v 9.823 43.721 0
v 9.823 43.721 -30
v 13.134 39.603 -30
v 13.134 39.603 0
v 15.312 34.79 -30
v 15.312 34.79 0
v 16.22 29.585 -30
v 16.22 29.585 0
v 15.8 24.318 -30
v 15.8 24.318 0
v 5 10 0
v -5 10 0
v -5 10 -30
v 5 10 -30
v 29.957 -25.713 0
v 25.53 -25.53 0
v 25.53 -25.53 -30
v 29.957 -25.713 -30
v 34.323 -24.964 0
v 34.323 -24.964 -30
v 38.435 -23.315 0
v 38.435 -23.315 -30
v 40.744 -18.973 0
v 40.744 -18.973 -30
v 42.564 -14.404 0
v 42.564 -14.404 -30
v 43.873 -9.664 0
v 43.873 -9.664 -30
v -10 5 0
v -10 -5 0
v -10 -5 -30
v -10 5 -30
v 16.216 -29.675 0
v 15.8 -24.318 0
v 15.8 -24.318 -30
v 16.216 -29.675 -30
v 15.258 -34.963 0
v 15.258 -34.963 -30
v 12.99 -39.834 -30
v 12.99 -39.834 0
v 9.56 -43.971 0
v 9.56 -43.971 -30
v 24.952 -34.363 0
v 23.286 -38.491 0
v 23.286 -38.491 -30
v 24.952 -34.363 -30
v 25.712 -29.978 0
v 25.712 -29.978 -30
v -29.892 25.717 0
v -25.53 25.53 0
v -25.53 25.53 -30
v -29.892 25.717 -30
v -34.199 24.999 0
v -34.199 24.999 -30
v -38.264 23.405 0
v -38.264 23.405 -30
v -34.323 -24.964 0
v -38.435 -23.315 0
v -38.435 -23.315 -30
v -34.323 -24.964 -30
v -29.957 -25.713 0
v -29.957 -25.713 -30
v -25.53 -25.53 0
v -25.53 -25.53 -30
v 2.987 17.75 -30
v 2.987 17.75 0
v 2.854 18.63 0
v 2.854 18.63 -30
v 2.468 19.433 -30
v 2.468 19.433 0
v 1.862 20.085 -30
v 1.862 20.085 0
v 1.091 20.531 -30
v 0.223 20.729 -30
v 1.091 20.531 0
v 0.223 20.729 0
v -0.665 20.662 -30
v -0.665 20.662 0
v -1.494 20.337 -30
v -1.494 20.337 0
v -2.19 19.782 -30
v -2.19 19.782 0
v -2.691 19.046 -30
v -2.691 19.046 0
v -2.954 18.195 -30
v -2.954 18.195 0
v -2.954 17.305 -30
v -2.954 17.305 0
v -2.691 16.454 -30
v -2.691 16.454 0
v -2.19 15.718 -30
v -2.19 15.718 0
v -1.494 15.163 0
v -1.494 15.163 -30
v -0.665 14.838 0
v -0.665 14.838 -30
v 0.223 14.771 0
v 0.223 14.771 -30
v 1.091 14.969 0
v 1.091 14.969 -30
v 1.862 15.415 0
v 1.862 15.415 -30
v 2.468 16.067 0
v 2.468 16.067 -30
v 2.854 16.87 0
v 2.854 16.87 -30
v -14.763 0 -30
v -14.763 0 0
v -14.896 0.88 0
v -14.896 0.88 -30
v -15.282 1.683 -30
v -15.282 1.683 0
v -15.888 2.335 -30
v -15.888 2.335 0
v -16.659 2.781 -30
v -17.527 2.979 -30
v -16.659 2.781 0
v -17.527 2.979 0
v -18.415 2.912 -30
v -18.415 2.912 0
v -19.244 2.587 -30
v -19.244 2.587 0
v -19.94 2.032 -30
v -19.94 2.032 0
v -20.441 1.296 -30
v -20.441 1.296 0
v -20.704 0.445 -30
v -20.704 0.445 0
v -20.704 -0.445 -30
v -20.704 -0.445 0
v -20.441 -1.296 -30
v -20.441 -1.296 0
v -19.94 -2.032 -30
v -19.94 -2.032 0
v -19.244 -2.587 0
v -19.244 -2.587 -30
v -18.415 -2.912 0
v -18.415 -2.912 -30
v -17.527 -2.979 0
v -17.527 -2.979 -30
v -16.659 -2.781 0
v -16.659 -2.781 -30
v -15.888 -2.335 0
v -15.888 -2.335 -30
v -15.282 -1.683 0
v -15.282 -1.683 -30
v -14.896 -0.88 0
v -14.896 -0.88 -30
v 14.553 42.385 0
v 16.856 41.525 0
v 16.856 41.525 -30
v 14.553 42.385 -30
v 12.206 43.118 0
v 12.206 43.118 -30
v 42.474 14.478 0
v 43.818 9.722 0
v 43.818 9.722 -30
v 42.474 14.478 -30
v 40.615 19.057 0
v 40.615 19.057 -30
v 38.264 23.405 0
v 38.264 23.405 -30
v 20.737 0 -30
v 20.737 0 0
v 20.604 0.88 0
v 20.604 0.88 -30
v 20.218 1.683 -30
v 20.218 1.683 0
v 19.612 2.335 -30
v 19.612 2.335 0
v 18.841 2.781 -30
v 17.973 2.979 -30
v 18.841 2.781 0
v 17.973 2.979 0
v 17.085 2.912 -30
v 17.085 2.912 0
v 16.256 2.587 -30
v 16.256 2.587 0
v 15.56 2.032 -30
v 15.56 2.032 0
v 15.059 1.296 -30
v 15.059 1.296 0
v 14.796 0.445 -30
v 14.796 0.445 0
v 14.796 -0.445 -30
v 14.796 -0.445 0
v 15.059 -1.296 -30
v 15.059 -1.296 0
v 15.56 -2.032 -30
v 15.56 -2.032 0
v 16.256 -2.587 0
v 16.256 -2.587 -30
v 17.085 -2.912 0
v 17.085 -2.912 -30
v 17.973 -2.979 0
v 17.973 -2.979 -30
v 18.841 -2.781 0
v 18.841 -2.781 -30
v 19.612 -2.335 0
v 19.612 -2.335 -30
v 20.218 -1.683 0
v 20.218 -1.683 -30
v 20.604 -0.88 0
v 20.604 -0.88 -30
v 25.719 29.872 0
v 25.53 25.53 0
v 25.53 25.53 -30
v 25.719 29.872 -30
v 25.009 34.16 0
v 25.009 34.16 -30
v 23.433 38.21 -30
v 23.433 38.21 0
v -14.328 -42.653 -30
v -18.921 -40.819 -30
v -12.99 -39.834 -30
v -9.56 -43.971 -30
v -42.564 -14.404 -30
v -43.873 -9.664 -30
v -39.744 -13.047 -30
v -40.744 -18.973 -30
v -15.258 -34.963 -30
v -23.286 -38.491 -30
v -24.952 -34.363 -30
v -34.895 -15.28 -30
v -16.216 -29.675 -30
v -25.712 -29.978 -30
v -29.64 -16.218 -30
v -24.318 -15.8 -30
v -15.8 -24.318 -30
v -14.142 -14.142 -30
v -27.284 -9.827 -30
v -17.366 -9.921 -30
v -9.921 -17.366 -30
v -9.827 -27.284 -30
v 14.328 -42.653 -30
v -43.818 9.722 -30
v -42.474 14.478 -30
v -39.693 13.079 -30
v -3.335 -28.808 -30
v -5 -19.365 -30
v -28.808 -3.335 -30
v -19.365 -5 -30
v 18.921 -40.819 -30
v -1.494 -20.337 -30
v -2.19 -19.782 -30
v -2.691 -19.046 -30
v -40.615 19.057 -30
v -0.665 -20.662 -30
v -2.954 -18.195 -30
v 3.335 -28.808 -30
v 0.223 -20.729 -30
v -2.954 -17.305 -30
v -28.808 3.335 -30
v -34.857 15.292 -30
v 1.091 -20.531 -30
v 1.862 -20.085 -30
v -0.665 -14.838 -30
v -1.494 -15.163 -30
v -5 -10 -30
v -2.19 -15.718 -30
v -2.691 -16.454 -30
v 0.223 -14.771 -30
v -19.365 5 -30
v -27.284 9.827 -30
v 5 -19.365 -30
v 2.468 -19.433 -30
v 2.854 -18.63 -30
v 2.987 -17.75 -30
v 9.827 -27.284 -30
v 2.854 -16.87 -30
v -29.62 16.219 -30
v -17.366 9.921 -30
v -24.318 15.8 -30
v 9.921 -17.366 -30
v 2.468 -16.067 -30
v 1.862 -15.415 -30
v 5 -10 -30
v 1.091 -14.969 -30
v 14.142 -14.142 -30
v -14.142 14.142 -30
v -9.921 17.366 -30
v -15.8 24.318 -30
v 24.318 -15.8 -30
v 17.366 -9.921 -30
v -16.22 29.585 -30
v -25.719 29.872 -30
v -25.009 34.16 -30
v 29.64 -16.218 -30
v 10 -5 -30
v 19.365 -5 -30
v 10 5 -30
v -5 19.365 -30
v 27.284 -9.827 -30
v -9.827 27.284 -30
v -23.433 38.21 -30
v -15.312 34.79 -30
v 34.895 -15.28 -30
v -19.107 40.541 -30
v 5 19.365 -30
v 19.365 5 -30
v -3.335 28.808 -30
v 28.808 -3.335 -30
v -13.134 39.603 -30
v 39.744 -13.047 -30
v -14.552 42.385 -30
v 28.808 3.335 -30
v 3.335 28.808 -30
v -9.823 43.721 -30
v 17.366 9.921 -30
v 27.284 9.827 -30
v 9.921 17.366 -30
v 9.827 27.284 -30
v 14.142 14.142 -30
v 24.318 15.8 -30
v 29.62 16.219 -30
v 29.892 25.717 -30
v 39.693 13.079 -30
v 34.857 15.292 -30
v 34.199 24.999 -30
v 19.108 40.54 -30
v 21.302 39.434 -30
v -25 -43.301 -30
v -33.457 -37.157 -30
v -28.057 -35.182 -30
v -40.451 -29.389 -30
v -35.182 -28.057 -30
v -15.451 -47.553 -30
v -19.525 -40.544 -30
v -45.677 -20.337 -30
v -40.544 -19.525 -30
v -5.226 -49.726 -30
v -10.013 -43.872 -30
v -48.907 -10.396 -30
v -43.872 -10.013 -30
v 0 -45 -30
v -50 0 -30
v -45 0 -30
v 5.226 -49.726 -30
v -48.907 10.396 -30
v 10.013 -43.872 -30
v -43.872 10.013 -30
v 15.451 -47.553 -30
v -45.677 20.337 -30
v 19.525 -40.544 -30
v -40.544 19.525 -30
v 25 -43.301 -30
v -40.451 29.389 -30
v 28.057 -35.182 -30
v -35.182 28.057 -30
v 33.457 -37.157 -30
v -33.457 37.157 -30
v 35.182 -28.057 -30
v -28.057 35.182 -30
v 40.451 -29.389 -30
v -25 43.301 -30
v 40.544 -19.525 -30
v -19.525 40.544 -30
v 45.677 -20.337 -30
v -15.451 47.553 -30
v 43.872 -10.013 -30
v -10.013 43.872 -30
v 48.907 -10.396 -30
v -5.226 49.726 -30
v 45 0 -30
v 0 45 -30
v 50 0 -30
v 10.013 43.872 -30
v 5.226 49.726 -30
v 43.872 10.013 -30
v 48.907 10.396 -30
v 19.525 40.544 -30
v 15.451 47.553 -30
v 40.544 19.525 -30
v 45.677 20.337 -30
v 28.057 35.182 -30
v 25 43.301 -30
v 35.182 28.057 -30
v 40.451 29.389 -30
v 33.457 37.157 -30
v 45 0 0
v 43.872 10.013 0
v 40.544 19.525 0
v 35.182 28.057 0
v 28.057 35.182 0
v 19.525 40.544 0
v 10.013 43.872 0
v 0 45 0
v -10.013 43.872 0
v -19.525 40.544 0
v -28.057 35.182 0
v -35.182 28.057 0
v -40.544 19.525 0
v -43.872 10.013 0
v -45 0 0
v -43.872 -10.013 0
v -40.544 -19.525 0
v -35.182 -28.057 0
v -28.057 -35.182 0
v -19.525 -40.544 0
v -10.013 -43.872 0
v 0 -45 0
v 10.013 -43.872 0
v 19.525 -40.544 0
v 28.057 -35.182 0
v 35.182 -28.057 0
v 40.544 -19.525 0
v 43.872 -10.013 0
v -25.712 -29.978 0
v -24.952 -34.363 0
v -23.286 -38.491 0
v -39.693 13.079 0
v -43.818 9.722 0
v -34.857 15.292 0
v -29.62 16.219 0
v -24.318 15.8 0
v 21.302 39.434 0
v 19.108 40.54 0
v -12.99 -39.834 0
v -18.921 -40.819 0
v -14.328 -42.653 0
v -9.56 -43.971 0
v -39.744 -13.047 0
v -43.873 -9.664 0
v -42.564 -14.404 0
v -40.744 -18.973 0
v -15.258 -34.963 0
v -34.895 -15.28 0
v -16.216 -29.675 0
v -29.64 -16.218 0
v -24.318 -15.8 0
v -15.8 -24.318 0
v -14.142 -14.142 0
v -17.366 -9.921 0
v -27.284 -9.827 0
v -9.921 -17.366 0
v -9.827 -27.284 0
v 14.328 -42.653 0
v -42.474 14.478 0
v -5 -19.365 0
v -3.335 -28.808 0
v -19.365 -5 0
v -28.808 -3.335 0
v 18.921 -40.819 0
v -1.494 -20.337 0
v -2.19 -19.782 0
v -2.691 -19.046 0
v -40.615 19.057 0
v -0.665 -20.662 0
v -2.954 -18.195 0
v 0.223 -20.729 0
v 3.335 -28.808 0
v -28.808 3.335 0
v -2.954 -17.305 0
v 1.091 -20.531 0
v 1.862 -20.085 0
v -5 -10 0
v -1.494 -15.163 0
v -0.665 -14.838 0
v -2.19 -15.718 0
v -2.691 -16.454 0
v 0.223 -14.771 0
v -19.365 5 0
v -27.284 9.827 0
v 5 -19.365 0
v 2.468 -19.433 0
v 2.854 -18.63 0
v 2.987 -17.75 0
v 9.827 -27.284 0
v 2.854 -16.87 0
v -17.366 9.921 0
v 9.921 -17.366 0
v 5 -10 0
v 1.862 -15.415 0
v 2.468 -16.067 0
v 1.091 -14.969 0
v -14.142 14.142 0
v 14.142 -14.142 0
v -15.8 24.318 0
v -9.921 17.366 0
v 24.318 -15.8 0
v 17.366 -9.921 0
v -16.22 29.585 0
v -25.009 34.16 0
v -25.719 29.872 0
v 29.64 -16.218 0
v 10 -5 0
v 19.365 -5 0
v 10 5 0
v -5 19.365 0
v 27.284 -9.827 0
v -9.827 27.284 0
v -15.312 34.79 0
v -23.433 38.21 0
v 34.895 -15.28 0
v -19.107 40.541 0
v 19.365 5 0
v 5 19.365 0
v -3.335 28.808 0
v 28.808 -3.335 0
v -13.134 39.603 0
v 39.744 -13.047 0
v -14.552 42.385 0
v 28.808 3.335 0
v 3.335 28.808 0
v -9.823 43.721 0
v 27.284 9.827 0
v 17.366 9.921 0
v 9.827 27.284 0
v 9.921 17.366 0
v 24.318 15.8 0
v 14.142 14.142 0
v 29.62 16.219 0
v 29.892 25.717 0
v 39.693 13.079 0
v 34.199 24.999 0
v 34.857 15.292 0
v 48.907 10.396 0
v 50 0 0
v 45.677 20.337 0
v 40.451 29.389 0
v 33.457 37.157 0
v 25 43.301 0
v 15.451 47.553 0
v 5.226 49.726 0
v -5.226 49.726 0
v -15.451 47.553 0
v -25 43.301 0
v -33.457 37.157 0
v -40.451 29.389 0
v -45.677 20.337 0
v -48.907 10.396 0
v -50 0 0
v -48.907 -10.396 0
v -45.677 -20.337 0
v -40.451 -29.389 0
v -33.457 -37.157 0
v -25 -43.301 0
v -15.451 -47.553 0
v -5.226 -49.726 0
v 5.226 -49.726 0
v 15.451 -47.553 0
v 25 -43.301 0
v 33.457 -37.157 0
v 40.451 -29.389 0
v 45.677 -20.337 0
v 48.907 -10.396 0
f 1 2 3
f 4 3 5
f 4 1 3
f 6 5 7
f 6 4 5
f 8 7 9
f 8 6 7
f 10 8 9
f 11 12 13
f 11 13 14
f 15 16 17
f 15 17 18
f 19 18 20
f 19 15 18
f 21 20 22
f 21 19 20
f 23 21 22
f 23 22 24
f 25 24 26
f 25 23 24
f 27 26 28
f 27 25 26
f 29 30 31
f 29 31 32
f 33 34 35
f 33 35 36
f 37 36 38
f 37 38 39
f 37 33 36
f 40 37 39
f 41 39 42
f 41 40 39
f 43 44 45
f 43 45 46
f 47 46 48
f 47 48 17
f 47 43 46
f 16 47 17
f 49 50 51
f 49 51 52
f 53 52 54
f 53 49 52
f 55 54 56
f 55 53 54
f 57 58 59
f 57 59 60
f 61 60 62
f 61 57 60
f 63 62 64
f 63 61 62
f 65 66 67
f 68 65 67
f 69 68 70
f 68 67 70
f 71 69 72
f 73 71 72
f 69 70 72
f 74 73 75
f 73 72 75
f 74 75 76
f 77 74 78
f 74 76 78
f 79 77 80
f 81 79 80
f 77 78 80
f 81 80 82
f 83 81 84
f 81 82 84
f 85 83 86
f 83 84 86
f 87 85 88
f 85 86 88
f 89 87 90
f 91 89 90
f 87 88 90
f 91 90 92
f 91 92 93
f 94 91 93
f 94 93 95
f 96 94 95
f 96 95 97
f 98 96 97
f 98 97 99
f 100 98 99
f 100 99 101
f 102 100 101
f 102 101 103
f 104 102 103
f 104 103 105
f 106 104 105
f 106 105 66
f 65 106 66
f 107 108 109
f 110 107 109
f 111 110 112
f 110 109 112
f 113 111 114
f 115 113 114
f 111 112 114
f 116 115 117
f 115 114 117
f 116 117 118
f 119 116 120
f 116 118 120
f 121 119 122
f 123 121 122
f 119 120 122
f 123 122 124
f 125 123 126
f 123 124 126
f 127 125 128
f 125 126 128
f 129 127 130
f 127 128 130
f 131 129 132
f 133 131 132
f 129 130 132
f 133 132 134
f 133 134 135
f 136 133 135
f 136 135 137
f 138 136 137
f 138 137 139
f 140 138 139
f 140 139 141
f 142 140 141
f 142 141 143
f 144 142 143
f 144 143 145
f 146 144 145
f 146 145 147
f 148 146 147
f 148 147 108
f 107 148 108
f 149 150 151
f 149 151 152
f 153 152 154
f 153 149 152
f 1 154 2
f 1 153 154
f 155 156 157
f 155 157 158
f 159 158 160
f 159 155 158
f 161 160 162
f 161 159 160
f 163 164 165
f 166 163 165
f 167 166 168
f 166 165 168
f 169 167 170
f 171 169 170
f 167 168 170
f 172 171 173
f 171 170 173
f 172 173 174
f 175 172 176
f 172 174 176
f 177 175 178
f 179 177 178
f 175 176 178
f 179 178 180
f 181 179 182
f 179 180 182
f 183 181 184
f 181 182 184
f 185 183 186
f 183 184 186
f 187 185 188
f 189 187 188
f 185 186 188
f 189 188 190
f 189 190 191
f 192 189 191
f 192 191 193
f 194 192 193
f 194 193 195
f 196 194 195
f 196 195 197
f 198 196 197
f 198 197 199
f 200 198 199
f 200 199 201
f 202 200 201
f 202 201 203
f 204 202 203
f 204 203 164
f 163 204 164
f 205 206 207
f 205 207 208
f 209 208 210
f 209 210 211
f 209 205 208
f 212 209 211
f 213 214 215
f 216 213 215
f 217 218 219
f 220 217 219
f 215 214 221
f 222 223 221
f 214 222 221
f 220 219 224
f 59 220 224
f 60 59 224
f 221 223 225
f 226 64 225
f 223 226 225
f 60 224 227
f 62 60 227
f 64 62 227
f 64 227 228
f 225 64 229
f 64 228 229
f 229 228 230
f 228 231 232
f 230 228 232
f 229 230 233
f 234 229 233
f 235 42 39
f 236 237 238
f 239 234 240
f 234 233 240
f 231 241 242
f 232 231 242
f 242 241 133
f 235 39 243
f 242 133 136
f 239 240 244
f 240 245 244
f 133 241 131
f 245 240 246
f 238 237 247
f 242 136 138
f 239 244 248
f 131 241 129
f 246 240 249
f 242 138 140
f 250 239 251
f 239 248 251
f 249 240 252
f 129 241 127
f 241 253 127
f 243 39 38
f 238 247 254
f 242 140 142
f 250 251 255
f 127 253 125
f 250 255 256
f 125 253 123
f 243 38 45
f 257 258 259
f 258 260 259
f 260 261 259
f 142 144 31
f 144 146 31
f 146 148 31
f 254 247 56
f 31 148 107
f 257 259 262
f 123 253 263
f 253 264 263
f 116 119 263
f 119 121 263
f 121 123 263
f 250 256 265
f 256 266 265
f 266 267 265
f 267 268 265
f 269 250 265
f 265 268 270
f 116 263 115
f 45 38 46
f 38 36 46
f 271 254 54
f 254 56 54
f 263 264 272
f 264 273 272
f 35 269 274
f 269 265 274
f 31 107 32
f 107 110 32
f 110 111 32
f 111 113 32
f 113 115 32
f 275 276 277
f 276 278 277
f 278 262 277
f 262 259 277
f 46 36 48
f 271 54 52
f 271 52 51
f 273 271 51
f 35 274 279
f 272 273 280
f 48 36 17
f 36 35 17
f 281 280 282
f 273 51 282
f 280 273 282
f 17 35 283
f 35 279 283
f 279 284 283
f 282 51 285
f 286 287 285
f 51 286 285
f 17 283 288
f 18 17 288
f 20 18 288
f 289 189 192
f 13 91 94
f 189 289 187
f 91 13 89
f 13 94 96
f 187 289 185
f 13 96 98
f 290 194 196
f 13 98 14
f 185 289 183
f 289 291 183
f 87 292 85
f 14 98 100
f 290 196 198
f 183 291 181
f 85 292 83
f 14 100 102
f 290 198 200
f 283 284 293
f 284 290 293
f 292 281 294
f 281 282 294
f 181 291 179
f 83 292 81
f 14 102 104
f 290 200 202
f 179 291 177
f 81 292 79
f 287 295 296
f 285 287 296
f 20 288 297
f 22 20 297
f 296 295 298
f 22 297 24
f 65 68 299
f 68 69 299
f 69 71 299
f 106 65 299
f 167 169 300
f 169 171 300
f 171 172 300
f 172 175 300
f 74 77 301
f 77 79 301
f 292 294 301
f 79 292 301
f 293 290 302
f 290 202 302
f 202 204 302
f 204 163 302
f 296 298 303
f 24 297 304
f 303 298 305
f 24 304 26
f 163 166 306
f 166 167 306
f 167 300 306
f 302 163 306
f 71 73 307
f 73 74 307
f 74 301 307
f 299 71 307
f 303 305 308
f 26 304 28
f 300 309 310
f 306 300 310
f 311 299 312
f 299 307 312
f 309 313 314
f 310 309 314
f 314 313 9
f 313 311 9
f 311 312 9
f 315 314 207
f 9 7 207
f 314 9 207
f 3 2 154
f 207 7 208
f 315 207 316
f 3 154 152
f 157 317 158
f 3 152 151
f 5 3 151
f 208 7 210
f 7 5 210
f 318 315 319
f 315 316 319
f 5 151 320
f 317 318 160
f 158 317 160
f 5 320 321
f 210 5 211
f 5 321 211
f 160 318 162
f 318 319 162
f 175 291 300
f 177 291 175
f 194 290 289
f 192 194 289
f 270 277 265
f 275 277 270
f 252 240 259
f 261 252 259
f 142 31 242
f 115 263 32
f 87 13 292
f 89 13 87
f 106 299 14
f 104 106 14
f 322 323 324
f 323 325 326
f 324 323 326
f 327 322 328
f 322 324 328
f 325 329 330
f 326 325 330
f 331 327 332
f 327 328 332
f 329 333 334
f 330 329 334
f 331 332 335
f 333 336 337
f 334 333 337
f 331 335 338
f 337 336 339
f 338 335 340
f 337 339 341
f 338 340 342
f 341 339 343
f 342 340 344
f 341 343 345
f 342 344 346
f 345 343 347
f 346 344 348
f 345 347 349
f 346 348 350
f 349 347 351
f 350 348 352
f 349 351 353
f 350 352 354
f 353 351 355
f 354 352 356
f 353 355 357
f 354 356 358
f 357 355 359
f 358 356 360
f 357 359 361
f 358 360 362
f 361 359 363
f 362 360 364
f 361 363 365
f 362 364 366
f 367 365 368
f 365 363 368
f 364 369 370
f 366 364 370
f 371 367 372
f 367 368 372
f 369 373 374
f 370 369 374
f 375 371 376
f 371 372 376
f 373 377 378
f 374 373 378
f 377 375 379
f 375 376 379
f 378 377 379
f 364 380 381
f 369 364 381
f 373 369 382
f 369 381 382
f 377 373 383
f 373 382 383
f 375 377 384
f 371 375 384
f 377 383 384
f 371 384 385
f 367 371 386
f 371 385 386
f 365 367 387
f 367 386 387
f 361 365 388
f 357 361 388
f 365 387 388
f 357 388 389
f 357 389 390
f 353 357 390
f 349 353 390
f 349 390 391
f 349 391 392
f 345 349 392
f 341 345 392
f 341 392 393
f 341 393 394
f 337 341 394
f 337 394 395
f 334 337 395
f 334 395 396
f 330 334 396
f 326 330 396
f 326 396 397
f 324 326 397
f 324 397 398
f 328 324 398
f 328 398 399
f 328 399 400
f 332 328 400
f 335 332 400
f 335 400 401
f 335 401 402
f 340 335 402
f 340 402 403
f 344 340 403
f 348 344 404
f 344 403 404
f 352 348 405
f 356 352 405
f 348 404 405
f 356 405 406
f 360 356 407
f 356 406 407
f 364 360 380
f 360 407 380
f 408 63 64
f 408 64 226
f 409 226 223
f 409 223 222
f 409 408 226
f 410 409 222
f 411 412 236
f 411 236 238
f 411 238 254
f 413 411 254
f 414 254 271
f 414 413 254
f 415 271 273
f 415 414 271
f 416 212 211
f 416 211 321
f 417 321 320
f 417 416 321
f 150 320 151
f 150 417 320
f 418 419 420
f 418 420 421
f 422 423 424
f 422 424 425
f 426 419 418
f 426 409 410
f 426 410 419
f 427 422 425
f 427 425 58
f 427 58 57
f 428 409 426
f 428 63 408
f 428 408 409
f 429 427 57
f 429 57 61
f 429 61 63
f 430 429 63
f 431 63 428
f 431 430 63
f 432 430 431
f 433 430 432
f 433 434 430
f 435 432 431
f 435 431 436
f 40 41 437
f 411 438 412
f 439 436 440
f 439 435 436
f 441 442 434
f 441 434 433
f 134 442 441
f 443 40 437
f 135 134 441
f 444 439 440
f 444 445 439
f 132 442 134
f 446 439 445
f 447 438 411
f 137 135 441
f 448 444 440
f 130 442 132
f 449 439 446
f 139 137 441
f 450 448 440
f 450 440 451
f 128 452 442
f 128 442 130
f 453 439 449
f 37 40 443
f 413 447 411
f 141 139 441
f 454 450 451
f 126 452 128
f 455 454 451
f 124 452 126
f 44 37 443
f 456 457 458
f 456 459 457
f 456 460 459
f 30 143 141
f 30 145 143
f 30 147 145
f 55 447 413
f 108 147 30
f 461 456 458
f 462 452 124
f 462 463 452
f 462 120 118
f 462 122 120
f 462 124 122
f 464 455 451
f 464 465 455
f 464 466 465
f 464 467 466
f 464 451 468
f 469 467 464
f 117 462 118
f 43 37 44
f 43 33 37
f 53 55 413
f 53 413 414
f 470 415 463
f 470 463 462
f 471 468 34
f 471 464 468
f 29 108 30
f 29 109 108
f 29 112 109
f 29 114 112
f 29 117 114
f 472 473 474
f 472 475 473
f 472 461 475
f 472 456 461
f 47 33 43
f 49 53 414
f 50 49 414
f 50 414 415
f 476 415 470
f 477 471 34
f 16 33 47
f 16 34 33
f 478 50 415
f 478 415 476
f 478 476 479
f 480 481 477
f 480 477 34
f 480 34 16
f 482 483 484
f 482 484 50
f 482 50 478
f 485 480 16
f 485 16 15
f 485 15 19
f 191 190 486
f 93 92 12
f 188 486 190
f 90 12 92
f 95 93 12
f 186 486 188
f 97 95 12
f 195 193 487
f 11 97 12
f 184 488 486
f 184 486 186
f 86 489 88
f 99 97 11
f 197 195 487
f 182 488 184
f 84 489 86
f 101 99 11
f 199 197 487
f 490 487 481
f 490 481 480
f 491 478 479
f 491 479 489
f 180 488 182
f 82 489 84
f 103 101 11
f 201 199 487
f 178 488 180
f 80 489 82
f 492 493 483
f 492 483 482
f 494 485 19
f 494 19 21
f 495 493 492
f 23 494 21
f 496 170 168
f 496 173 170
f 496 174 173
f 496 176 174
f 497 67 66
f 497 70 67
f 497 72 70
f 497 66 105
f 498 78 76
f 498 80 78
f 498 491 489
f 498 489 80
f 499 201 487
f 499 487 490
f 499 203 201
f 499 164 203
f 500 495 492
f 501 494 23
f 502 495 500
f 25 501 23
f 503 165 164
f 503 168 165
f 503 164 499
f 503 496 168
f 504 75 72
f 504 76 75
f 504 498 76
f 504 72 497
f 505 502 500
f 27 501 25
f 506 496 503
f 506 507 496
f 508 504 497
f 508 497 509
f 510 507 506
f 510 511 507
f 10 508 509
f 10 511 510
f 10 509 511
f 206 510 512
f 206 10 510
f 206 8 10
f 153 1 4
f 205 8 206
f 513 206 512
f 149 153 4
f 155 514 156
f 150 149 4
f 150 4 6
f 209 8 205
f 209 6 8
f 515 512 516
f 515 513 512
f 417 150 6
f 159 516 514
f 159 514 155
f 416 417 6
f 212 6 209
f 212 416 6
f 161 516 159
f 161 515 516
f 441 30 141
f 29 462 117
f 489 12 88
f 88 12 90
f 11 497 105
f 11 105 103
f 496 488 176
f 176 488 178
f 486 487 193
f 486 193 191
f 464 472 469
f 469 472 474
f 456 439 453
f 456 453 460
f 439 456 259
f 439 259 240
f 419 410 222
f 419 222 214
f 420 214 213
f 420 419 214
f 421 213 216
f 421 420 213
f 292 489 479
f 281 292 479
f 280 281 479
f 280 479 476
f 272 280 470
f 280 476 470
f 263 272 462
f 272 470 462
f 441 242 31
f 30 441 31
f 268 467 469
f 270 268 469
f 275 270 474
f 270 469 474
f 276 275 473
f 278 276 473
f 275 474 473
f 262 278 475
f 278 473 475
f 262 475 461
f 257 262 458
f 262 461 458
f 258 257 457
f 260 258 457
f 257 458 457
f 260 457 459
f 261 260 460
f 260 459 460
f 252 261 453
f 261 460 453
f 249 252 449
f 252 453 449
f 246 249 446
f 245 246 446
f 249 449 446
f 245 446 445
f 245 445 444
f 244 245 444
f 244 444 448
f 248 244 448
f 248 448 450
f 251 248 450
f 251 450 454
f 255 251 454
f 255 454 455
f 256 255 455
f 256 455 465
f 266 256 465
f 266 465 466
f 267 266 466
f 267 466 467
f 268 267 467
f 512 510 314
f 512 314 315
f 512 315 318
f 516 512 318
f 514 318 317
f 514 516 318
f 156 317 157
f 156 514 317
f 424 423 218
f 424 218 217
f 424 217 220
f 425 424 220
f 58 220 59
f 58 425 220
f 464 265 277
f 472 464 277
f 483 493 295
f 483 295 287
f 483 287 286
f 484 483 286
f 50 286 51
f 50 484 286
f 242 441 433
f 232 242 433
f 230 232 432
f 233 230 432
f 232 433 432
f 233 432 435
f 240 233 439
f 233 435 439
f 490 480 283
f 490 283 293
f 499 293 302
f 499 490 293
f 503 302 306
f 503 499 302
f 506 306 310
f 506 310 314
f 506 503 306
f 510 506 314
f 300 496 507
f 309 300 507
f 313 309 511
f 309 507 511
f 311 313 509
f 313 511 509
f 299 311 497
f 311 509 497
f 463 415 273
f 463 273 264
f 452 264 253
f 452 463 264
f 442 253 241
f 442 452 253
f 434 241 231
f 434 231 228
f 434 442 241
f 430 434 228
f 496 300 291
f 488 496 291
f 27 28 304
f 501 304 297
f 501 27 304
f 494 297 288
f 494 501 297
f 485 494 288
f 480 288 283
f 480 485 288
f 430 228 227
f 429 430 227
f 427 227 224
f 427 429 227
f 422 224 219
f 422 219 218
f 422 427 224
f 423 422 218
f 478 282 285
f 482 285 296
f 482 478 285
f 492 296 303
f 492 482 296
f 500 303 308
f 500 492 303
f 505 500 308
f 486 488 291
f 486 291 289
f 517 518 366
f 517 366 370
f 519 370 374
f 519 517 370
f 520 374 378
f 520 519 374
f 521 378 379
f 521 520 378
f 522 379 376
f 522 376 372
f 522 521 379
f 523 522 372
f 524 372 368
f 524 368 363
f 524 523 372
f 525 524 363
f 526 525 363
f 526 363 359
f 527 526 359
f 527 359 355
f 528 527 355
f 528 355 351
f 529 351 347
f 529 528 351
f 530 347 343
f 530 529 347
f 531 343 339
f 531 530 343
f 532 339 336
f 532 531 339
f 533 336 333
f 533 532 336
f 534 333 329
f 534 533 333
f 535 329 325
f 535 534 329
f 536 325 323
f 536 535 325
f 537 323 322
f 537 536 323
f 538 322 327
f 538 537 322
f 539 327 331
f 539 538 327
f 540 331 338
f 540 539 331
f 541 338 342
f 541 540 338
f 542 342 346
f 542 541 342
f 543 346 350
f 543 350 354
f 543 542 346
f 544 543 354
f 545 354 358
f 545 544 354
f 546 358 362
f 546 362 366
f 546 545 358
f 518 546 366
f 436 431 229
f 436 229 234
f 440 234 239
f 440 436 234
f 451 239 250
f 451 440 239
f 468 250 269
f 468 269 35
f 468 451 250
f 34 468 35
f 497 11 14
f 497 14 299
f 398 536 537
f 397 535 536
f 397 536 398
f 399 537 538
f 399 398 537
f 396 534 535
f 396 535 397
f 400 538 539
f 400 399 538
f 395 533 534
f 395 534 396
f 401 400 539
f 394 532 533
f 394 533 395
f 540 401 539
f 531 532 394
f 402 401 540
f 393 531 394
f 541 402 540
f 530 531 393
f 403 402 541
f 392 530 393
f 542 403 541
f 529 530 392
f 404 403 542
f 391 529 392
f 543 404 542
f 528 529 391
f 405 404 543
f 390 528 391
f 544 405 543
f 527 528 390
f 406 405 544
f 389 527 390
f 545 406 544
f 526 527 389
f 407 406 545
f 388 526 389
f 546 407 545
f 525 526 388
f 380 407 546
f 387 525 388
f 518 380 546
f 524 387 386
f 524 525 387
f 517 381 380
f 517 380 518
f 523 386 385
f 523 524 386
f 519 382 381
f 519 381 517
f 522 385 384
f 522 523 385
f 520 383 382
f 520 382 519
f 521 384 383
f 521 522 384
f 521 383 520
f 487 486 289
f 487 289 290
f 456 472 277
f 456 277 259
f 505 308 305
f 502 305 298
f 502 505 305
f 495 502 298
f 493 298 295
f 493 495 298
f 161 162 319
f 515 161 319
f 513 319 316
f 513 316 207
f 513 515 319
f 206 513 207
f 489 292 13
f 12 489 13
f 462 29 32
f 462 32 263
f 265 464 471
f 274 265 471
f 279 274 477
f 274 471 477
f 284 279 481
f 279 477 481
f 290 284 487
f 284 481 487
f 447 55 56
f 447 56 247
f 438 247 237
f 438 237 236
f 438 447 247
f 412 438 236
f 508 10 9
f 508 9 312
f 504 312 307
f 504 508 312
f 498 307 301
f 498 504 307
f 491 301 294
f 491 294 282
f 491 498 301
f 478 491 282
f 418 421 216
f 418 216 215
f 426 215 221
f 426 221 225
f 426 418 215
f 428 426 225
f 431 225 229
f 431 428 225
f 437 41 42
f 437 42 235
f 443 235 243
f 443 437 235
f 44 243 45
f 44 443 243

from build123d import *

# Parameters (mm, degrees)
SKETCH6_R                        = 29
SKETCH6_R_2                      = 20
INNER_RING_DEPTH                 = 30
MOTOR_CONNECTOR_CUT_DEPTH        = 30
SKETCH9_R                        = 50
SKETCH9_R_2                      = 29
OUTSIDE_RING_EXTRUSION_DEPTH     = 30
SKETCH12_R                       = 45
SKETCH12_R_2                     = 27.5
CUT_EXTRUDE6_DEPTH               = 38
CUT_EXTRUDE6_DEPTH_BACK          = 56
SKETCH8_R                        = 2.987
MOTOR_CONNECTOR_HOLES_DEPTH      = 27
MOTOR_CONNECTOR_HOLES_DEPTH_BACK = 41
SKETCH10_R                       = 27.404299948
PATTERN_DEPTH                    = 30


with BuildPart() as part:
    # Sketch6 → Inner Ring (new body)
    with BuildSketch(Plane.XY):
        Circle(SKETCH6_R)
        Circle(SKETCH6_R_2, mode=Mode.SUBTRACT)
    extrude(amount=-INNER_RING_DEPTH)

    # Sketch7 → Motor Connector Cut (add)
    with BuildSketch(Plane.XY):
        with BuildLine():
            ThreePointArc((20, 0), (19.840593925, 2.52008585), (19.364916731, 5))
            Line((19.364916731, 5), (9.999996731, 5))
            Line((9.999996731, 5), (9.999996731, -5))
            Line((9.999996731, -5), (19.364916731, -5))
            ThreePointArc((19.364916731, -5), (19.840593925, -2.52008585), (20, 0))
        make_face()
        with BuildLine():
            ThreePointArc((5, 19.364916731), (0, 20), (-5, 19.364916731))
            Line((-5, 19.364916731), (-5, 9.999996731))
            Line((-5, 9.999996731), (5, 9.999996731))
            Line((5, 9.999996731), (5, 19.364916731))
        make_face()
        with BuildLine():
            Line((-9.999996731, -5), (-9.999996731, 5))
            Line((-9.999996731, 5), (-19.364916731, 5))
            ThreePointArc((-19.364916731, 5), (-20, 0), (-19.364916731, -5))
            Line((-19.364916731, -5), (-9.999996731, -5))
        make_face()
        with BuildLine():
            Line((-5, -9.999996731), (-5, -19.364916731))
            ThreePointArc((-5, -19.364916731), (0, -20), (5, -19.364916731))
            Line((5, -19.364916731), (5, -9.999996731))
            Line((5, -9.999996731), (-5, -9.999996731))
        make_face()
    extrude(amount=-MOTOR_CONNECTOR_CUT_DEPTH)

    # Sketch9 → Outside Ring Extrusion (add)
    with BuildSketch(Plane.XY):
        Circle(SKETCH9_R)
        Circle(SKETCH9_R_2, mode=Mode.SUBTRACT)
    extrude(amount=-OUTSIDE_RING_EXTRUSION_DEPTH)

    # Sketch12 → Cut-Extrude6 (cut, two sides)
    with BuildSketch(Plane.XY) as cut_extrude6_sk:
        Circle(SKETCH12_R)
        Circle(SKETCH12_R_2, mode=Mode.SUBTRACT)
    extrude(amount=CUT_EXTRUDE6_DEPTH, mode=Mode.SUBTRACT)
    extrude(cut_extrude6_sk.sketch, amount=-CUT_EXTRUDE6_DEPTH_BACK, mode=Mode.SUBTRACT)

    # Sketch8 → Motor Connector Holes (cut, two sides)
    with BuildSketch(Plane.XY) as motor_connector_holes_sk:
        with Locations((0, 17.75)):
            Circle(SKETCH8_R)
        with Locations((17.75, 0)):
            Circle(SKETCH8_R)
        with Locations((0, -17.75)):
            Circle(SKETCH8_R)
        with Locations((-17.75, 0)):
            Circle(SKETCH8_R)
    extrude(amount=MOTOR_CONNECTOR_HOLES_DEPTH, mode=Mode.SUBTRACT)
    extrude(motor_connector_holes_sk.sketch, amount=-MOTOR_CONNECTOR_HOLES_DEPTH_BACK, mode=Mode.SUBTRACT)

    # Sketch10 → Pattern (add)
    with BuildSketch(Plane.XY):
        with BuildLine():
            ThreePointArc((24.317625284, 15.800414568), (34.856582319, 15.291767932), (43.817916626, 9.721954269))
            ThreePointArc((43.817916626, 9.721954269), (41.607188912, 16.793289988), (38.263814419, 23.404867172))
            ThreePointArc((38.263814419, 23.404867172), (32.064348025, 25.470287935), (25.530148518, 25.530148518))
            ThreePointArc((25.530148518, 25.530148518), (25.475284033, 32.034279432), (23.432821057, 38.209639668))
            ThreePointArc((23.432821057, 38.209639668), (20.212556871, 40.002288656), (16.856128399, 41.524812789))
            ThreePointArc((16.856128399, 41.524812789), (13.384732217, 42.767397097), (9.823095744, 43.720997037))
            ThreePointArc((9.823095744, 43.720997037), (15.312499865, 34.789679765), (15.800414568, 24.317625284))
            ThreePointArc((15.800414568, 24.317625284), (0, 29), (-15.800414568, 24.317625284))
            ThreePointArc((-15.800414568, 24.317625284), (-15.312499865, 34.789679765), (-9.823095744, 43.720997037))
            ThreePointArc((-9.823095744, 43.720997037), (-16.854754984, 41.52536899), (-23.432821057, 38.209639668))
            ThreePointArc((-23.432821057, 38.209639668), (-25.475284033, 32.034279432), (-25.530148518, 25.530148518))
            ThreePointArc((-25.530148518, 25.530148518), (-32.064348025, 25.470287935), (-38.263814419, 23.404867172))
            ThreePointArc((-38.263814419, 23.404867172), (-41.607188912, 16.793289988), (-43.817916626, 9.721954269))
            ThreePointArc((-43.817916626, 9.721954269), (-34.856582319, 15.291767932), (-24.317625284, 15.800414568))
            ThreePointArc((-24.317625284, 15.800414568), (-29, 0), (-24.317625284, -15.800414568))
            ThreePointArc((-24.317625284, -15.800414568), (-34.894848495, -15.279799844), (-43.87309253, -9.663767027))
            ThreePointArc((-43.87309253, -9.663767027), (-41.716263612, -16.713446711), (-38.435015504, -23.315212041))
            ThreePointArc((-38.435015504, -23.315212041), (-32.159621016, -25.454161245), (-25.530148518, -25.530148518))
            ThreePointArc((-25.530148518, -25.530148518), (-25.448803812, -32.190695038), (-23.285614603, -38.490703716))
            ThreePointArc((-23.285614603, -38.490703716), (-16.649731385, -41.799208281), (-9.559859326, -43.970581744))
            ThreePointArc((-9.559859326, -43.970581744), (-15.258354287, -34.962784804), (-15.800414568, -24.317625284))
            ThreePointArc((-15.800414568, -24.317625284), (0, -29), (15.800414568, -24.317625284))
            ThreePointArc((15.800414568, -24.317625284), (15.258354287, -34.962784804), (9.559859326, -43.970581744))
            ThreePointArc((9.559859326, -43.970581744), (16.649731385, -41.799208281), (23.285614603, -38.490703716))
            ThreePointArc((23.285614603, -38.490703716), (25.448803812, -32.190695038), (25.530148518, -25.530148518))
            ThreePointArc((25.530148518, -25.530148518), (32.159621016, -25.454161245), (38.435015504, -23.315212041))
            ThreePointArc((38.435015504, -23.315212041), (41.716263612, -16.713446711), (43.87309253, -9.663767027))
            ThreePointArc((43.87309253, -9.663767027), (34.894848495, -15.279799844), (24.317625284, -15.800414568))
            ThreePointArc((24.317625284, -15.800414568), (29, 0), (24.317625284, 15.800414568))
        make_face()
        with Locations((-0.095700052, 0)):
            Circle(SKETCH10_R, mode=Mode.SUBTRACT)
    extrude(amount=-PATTERN_DEPTH)


solid = part.part
